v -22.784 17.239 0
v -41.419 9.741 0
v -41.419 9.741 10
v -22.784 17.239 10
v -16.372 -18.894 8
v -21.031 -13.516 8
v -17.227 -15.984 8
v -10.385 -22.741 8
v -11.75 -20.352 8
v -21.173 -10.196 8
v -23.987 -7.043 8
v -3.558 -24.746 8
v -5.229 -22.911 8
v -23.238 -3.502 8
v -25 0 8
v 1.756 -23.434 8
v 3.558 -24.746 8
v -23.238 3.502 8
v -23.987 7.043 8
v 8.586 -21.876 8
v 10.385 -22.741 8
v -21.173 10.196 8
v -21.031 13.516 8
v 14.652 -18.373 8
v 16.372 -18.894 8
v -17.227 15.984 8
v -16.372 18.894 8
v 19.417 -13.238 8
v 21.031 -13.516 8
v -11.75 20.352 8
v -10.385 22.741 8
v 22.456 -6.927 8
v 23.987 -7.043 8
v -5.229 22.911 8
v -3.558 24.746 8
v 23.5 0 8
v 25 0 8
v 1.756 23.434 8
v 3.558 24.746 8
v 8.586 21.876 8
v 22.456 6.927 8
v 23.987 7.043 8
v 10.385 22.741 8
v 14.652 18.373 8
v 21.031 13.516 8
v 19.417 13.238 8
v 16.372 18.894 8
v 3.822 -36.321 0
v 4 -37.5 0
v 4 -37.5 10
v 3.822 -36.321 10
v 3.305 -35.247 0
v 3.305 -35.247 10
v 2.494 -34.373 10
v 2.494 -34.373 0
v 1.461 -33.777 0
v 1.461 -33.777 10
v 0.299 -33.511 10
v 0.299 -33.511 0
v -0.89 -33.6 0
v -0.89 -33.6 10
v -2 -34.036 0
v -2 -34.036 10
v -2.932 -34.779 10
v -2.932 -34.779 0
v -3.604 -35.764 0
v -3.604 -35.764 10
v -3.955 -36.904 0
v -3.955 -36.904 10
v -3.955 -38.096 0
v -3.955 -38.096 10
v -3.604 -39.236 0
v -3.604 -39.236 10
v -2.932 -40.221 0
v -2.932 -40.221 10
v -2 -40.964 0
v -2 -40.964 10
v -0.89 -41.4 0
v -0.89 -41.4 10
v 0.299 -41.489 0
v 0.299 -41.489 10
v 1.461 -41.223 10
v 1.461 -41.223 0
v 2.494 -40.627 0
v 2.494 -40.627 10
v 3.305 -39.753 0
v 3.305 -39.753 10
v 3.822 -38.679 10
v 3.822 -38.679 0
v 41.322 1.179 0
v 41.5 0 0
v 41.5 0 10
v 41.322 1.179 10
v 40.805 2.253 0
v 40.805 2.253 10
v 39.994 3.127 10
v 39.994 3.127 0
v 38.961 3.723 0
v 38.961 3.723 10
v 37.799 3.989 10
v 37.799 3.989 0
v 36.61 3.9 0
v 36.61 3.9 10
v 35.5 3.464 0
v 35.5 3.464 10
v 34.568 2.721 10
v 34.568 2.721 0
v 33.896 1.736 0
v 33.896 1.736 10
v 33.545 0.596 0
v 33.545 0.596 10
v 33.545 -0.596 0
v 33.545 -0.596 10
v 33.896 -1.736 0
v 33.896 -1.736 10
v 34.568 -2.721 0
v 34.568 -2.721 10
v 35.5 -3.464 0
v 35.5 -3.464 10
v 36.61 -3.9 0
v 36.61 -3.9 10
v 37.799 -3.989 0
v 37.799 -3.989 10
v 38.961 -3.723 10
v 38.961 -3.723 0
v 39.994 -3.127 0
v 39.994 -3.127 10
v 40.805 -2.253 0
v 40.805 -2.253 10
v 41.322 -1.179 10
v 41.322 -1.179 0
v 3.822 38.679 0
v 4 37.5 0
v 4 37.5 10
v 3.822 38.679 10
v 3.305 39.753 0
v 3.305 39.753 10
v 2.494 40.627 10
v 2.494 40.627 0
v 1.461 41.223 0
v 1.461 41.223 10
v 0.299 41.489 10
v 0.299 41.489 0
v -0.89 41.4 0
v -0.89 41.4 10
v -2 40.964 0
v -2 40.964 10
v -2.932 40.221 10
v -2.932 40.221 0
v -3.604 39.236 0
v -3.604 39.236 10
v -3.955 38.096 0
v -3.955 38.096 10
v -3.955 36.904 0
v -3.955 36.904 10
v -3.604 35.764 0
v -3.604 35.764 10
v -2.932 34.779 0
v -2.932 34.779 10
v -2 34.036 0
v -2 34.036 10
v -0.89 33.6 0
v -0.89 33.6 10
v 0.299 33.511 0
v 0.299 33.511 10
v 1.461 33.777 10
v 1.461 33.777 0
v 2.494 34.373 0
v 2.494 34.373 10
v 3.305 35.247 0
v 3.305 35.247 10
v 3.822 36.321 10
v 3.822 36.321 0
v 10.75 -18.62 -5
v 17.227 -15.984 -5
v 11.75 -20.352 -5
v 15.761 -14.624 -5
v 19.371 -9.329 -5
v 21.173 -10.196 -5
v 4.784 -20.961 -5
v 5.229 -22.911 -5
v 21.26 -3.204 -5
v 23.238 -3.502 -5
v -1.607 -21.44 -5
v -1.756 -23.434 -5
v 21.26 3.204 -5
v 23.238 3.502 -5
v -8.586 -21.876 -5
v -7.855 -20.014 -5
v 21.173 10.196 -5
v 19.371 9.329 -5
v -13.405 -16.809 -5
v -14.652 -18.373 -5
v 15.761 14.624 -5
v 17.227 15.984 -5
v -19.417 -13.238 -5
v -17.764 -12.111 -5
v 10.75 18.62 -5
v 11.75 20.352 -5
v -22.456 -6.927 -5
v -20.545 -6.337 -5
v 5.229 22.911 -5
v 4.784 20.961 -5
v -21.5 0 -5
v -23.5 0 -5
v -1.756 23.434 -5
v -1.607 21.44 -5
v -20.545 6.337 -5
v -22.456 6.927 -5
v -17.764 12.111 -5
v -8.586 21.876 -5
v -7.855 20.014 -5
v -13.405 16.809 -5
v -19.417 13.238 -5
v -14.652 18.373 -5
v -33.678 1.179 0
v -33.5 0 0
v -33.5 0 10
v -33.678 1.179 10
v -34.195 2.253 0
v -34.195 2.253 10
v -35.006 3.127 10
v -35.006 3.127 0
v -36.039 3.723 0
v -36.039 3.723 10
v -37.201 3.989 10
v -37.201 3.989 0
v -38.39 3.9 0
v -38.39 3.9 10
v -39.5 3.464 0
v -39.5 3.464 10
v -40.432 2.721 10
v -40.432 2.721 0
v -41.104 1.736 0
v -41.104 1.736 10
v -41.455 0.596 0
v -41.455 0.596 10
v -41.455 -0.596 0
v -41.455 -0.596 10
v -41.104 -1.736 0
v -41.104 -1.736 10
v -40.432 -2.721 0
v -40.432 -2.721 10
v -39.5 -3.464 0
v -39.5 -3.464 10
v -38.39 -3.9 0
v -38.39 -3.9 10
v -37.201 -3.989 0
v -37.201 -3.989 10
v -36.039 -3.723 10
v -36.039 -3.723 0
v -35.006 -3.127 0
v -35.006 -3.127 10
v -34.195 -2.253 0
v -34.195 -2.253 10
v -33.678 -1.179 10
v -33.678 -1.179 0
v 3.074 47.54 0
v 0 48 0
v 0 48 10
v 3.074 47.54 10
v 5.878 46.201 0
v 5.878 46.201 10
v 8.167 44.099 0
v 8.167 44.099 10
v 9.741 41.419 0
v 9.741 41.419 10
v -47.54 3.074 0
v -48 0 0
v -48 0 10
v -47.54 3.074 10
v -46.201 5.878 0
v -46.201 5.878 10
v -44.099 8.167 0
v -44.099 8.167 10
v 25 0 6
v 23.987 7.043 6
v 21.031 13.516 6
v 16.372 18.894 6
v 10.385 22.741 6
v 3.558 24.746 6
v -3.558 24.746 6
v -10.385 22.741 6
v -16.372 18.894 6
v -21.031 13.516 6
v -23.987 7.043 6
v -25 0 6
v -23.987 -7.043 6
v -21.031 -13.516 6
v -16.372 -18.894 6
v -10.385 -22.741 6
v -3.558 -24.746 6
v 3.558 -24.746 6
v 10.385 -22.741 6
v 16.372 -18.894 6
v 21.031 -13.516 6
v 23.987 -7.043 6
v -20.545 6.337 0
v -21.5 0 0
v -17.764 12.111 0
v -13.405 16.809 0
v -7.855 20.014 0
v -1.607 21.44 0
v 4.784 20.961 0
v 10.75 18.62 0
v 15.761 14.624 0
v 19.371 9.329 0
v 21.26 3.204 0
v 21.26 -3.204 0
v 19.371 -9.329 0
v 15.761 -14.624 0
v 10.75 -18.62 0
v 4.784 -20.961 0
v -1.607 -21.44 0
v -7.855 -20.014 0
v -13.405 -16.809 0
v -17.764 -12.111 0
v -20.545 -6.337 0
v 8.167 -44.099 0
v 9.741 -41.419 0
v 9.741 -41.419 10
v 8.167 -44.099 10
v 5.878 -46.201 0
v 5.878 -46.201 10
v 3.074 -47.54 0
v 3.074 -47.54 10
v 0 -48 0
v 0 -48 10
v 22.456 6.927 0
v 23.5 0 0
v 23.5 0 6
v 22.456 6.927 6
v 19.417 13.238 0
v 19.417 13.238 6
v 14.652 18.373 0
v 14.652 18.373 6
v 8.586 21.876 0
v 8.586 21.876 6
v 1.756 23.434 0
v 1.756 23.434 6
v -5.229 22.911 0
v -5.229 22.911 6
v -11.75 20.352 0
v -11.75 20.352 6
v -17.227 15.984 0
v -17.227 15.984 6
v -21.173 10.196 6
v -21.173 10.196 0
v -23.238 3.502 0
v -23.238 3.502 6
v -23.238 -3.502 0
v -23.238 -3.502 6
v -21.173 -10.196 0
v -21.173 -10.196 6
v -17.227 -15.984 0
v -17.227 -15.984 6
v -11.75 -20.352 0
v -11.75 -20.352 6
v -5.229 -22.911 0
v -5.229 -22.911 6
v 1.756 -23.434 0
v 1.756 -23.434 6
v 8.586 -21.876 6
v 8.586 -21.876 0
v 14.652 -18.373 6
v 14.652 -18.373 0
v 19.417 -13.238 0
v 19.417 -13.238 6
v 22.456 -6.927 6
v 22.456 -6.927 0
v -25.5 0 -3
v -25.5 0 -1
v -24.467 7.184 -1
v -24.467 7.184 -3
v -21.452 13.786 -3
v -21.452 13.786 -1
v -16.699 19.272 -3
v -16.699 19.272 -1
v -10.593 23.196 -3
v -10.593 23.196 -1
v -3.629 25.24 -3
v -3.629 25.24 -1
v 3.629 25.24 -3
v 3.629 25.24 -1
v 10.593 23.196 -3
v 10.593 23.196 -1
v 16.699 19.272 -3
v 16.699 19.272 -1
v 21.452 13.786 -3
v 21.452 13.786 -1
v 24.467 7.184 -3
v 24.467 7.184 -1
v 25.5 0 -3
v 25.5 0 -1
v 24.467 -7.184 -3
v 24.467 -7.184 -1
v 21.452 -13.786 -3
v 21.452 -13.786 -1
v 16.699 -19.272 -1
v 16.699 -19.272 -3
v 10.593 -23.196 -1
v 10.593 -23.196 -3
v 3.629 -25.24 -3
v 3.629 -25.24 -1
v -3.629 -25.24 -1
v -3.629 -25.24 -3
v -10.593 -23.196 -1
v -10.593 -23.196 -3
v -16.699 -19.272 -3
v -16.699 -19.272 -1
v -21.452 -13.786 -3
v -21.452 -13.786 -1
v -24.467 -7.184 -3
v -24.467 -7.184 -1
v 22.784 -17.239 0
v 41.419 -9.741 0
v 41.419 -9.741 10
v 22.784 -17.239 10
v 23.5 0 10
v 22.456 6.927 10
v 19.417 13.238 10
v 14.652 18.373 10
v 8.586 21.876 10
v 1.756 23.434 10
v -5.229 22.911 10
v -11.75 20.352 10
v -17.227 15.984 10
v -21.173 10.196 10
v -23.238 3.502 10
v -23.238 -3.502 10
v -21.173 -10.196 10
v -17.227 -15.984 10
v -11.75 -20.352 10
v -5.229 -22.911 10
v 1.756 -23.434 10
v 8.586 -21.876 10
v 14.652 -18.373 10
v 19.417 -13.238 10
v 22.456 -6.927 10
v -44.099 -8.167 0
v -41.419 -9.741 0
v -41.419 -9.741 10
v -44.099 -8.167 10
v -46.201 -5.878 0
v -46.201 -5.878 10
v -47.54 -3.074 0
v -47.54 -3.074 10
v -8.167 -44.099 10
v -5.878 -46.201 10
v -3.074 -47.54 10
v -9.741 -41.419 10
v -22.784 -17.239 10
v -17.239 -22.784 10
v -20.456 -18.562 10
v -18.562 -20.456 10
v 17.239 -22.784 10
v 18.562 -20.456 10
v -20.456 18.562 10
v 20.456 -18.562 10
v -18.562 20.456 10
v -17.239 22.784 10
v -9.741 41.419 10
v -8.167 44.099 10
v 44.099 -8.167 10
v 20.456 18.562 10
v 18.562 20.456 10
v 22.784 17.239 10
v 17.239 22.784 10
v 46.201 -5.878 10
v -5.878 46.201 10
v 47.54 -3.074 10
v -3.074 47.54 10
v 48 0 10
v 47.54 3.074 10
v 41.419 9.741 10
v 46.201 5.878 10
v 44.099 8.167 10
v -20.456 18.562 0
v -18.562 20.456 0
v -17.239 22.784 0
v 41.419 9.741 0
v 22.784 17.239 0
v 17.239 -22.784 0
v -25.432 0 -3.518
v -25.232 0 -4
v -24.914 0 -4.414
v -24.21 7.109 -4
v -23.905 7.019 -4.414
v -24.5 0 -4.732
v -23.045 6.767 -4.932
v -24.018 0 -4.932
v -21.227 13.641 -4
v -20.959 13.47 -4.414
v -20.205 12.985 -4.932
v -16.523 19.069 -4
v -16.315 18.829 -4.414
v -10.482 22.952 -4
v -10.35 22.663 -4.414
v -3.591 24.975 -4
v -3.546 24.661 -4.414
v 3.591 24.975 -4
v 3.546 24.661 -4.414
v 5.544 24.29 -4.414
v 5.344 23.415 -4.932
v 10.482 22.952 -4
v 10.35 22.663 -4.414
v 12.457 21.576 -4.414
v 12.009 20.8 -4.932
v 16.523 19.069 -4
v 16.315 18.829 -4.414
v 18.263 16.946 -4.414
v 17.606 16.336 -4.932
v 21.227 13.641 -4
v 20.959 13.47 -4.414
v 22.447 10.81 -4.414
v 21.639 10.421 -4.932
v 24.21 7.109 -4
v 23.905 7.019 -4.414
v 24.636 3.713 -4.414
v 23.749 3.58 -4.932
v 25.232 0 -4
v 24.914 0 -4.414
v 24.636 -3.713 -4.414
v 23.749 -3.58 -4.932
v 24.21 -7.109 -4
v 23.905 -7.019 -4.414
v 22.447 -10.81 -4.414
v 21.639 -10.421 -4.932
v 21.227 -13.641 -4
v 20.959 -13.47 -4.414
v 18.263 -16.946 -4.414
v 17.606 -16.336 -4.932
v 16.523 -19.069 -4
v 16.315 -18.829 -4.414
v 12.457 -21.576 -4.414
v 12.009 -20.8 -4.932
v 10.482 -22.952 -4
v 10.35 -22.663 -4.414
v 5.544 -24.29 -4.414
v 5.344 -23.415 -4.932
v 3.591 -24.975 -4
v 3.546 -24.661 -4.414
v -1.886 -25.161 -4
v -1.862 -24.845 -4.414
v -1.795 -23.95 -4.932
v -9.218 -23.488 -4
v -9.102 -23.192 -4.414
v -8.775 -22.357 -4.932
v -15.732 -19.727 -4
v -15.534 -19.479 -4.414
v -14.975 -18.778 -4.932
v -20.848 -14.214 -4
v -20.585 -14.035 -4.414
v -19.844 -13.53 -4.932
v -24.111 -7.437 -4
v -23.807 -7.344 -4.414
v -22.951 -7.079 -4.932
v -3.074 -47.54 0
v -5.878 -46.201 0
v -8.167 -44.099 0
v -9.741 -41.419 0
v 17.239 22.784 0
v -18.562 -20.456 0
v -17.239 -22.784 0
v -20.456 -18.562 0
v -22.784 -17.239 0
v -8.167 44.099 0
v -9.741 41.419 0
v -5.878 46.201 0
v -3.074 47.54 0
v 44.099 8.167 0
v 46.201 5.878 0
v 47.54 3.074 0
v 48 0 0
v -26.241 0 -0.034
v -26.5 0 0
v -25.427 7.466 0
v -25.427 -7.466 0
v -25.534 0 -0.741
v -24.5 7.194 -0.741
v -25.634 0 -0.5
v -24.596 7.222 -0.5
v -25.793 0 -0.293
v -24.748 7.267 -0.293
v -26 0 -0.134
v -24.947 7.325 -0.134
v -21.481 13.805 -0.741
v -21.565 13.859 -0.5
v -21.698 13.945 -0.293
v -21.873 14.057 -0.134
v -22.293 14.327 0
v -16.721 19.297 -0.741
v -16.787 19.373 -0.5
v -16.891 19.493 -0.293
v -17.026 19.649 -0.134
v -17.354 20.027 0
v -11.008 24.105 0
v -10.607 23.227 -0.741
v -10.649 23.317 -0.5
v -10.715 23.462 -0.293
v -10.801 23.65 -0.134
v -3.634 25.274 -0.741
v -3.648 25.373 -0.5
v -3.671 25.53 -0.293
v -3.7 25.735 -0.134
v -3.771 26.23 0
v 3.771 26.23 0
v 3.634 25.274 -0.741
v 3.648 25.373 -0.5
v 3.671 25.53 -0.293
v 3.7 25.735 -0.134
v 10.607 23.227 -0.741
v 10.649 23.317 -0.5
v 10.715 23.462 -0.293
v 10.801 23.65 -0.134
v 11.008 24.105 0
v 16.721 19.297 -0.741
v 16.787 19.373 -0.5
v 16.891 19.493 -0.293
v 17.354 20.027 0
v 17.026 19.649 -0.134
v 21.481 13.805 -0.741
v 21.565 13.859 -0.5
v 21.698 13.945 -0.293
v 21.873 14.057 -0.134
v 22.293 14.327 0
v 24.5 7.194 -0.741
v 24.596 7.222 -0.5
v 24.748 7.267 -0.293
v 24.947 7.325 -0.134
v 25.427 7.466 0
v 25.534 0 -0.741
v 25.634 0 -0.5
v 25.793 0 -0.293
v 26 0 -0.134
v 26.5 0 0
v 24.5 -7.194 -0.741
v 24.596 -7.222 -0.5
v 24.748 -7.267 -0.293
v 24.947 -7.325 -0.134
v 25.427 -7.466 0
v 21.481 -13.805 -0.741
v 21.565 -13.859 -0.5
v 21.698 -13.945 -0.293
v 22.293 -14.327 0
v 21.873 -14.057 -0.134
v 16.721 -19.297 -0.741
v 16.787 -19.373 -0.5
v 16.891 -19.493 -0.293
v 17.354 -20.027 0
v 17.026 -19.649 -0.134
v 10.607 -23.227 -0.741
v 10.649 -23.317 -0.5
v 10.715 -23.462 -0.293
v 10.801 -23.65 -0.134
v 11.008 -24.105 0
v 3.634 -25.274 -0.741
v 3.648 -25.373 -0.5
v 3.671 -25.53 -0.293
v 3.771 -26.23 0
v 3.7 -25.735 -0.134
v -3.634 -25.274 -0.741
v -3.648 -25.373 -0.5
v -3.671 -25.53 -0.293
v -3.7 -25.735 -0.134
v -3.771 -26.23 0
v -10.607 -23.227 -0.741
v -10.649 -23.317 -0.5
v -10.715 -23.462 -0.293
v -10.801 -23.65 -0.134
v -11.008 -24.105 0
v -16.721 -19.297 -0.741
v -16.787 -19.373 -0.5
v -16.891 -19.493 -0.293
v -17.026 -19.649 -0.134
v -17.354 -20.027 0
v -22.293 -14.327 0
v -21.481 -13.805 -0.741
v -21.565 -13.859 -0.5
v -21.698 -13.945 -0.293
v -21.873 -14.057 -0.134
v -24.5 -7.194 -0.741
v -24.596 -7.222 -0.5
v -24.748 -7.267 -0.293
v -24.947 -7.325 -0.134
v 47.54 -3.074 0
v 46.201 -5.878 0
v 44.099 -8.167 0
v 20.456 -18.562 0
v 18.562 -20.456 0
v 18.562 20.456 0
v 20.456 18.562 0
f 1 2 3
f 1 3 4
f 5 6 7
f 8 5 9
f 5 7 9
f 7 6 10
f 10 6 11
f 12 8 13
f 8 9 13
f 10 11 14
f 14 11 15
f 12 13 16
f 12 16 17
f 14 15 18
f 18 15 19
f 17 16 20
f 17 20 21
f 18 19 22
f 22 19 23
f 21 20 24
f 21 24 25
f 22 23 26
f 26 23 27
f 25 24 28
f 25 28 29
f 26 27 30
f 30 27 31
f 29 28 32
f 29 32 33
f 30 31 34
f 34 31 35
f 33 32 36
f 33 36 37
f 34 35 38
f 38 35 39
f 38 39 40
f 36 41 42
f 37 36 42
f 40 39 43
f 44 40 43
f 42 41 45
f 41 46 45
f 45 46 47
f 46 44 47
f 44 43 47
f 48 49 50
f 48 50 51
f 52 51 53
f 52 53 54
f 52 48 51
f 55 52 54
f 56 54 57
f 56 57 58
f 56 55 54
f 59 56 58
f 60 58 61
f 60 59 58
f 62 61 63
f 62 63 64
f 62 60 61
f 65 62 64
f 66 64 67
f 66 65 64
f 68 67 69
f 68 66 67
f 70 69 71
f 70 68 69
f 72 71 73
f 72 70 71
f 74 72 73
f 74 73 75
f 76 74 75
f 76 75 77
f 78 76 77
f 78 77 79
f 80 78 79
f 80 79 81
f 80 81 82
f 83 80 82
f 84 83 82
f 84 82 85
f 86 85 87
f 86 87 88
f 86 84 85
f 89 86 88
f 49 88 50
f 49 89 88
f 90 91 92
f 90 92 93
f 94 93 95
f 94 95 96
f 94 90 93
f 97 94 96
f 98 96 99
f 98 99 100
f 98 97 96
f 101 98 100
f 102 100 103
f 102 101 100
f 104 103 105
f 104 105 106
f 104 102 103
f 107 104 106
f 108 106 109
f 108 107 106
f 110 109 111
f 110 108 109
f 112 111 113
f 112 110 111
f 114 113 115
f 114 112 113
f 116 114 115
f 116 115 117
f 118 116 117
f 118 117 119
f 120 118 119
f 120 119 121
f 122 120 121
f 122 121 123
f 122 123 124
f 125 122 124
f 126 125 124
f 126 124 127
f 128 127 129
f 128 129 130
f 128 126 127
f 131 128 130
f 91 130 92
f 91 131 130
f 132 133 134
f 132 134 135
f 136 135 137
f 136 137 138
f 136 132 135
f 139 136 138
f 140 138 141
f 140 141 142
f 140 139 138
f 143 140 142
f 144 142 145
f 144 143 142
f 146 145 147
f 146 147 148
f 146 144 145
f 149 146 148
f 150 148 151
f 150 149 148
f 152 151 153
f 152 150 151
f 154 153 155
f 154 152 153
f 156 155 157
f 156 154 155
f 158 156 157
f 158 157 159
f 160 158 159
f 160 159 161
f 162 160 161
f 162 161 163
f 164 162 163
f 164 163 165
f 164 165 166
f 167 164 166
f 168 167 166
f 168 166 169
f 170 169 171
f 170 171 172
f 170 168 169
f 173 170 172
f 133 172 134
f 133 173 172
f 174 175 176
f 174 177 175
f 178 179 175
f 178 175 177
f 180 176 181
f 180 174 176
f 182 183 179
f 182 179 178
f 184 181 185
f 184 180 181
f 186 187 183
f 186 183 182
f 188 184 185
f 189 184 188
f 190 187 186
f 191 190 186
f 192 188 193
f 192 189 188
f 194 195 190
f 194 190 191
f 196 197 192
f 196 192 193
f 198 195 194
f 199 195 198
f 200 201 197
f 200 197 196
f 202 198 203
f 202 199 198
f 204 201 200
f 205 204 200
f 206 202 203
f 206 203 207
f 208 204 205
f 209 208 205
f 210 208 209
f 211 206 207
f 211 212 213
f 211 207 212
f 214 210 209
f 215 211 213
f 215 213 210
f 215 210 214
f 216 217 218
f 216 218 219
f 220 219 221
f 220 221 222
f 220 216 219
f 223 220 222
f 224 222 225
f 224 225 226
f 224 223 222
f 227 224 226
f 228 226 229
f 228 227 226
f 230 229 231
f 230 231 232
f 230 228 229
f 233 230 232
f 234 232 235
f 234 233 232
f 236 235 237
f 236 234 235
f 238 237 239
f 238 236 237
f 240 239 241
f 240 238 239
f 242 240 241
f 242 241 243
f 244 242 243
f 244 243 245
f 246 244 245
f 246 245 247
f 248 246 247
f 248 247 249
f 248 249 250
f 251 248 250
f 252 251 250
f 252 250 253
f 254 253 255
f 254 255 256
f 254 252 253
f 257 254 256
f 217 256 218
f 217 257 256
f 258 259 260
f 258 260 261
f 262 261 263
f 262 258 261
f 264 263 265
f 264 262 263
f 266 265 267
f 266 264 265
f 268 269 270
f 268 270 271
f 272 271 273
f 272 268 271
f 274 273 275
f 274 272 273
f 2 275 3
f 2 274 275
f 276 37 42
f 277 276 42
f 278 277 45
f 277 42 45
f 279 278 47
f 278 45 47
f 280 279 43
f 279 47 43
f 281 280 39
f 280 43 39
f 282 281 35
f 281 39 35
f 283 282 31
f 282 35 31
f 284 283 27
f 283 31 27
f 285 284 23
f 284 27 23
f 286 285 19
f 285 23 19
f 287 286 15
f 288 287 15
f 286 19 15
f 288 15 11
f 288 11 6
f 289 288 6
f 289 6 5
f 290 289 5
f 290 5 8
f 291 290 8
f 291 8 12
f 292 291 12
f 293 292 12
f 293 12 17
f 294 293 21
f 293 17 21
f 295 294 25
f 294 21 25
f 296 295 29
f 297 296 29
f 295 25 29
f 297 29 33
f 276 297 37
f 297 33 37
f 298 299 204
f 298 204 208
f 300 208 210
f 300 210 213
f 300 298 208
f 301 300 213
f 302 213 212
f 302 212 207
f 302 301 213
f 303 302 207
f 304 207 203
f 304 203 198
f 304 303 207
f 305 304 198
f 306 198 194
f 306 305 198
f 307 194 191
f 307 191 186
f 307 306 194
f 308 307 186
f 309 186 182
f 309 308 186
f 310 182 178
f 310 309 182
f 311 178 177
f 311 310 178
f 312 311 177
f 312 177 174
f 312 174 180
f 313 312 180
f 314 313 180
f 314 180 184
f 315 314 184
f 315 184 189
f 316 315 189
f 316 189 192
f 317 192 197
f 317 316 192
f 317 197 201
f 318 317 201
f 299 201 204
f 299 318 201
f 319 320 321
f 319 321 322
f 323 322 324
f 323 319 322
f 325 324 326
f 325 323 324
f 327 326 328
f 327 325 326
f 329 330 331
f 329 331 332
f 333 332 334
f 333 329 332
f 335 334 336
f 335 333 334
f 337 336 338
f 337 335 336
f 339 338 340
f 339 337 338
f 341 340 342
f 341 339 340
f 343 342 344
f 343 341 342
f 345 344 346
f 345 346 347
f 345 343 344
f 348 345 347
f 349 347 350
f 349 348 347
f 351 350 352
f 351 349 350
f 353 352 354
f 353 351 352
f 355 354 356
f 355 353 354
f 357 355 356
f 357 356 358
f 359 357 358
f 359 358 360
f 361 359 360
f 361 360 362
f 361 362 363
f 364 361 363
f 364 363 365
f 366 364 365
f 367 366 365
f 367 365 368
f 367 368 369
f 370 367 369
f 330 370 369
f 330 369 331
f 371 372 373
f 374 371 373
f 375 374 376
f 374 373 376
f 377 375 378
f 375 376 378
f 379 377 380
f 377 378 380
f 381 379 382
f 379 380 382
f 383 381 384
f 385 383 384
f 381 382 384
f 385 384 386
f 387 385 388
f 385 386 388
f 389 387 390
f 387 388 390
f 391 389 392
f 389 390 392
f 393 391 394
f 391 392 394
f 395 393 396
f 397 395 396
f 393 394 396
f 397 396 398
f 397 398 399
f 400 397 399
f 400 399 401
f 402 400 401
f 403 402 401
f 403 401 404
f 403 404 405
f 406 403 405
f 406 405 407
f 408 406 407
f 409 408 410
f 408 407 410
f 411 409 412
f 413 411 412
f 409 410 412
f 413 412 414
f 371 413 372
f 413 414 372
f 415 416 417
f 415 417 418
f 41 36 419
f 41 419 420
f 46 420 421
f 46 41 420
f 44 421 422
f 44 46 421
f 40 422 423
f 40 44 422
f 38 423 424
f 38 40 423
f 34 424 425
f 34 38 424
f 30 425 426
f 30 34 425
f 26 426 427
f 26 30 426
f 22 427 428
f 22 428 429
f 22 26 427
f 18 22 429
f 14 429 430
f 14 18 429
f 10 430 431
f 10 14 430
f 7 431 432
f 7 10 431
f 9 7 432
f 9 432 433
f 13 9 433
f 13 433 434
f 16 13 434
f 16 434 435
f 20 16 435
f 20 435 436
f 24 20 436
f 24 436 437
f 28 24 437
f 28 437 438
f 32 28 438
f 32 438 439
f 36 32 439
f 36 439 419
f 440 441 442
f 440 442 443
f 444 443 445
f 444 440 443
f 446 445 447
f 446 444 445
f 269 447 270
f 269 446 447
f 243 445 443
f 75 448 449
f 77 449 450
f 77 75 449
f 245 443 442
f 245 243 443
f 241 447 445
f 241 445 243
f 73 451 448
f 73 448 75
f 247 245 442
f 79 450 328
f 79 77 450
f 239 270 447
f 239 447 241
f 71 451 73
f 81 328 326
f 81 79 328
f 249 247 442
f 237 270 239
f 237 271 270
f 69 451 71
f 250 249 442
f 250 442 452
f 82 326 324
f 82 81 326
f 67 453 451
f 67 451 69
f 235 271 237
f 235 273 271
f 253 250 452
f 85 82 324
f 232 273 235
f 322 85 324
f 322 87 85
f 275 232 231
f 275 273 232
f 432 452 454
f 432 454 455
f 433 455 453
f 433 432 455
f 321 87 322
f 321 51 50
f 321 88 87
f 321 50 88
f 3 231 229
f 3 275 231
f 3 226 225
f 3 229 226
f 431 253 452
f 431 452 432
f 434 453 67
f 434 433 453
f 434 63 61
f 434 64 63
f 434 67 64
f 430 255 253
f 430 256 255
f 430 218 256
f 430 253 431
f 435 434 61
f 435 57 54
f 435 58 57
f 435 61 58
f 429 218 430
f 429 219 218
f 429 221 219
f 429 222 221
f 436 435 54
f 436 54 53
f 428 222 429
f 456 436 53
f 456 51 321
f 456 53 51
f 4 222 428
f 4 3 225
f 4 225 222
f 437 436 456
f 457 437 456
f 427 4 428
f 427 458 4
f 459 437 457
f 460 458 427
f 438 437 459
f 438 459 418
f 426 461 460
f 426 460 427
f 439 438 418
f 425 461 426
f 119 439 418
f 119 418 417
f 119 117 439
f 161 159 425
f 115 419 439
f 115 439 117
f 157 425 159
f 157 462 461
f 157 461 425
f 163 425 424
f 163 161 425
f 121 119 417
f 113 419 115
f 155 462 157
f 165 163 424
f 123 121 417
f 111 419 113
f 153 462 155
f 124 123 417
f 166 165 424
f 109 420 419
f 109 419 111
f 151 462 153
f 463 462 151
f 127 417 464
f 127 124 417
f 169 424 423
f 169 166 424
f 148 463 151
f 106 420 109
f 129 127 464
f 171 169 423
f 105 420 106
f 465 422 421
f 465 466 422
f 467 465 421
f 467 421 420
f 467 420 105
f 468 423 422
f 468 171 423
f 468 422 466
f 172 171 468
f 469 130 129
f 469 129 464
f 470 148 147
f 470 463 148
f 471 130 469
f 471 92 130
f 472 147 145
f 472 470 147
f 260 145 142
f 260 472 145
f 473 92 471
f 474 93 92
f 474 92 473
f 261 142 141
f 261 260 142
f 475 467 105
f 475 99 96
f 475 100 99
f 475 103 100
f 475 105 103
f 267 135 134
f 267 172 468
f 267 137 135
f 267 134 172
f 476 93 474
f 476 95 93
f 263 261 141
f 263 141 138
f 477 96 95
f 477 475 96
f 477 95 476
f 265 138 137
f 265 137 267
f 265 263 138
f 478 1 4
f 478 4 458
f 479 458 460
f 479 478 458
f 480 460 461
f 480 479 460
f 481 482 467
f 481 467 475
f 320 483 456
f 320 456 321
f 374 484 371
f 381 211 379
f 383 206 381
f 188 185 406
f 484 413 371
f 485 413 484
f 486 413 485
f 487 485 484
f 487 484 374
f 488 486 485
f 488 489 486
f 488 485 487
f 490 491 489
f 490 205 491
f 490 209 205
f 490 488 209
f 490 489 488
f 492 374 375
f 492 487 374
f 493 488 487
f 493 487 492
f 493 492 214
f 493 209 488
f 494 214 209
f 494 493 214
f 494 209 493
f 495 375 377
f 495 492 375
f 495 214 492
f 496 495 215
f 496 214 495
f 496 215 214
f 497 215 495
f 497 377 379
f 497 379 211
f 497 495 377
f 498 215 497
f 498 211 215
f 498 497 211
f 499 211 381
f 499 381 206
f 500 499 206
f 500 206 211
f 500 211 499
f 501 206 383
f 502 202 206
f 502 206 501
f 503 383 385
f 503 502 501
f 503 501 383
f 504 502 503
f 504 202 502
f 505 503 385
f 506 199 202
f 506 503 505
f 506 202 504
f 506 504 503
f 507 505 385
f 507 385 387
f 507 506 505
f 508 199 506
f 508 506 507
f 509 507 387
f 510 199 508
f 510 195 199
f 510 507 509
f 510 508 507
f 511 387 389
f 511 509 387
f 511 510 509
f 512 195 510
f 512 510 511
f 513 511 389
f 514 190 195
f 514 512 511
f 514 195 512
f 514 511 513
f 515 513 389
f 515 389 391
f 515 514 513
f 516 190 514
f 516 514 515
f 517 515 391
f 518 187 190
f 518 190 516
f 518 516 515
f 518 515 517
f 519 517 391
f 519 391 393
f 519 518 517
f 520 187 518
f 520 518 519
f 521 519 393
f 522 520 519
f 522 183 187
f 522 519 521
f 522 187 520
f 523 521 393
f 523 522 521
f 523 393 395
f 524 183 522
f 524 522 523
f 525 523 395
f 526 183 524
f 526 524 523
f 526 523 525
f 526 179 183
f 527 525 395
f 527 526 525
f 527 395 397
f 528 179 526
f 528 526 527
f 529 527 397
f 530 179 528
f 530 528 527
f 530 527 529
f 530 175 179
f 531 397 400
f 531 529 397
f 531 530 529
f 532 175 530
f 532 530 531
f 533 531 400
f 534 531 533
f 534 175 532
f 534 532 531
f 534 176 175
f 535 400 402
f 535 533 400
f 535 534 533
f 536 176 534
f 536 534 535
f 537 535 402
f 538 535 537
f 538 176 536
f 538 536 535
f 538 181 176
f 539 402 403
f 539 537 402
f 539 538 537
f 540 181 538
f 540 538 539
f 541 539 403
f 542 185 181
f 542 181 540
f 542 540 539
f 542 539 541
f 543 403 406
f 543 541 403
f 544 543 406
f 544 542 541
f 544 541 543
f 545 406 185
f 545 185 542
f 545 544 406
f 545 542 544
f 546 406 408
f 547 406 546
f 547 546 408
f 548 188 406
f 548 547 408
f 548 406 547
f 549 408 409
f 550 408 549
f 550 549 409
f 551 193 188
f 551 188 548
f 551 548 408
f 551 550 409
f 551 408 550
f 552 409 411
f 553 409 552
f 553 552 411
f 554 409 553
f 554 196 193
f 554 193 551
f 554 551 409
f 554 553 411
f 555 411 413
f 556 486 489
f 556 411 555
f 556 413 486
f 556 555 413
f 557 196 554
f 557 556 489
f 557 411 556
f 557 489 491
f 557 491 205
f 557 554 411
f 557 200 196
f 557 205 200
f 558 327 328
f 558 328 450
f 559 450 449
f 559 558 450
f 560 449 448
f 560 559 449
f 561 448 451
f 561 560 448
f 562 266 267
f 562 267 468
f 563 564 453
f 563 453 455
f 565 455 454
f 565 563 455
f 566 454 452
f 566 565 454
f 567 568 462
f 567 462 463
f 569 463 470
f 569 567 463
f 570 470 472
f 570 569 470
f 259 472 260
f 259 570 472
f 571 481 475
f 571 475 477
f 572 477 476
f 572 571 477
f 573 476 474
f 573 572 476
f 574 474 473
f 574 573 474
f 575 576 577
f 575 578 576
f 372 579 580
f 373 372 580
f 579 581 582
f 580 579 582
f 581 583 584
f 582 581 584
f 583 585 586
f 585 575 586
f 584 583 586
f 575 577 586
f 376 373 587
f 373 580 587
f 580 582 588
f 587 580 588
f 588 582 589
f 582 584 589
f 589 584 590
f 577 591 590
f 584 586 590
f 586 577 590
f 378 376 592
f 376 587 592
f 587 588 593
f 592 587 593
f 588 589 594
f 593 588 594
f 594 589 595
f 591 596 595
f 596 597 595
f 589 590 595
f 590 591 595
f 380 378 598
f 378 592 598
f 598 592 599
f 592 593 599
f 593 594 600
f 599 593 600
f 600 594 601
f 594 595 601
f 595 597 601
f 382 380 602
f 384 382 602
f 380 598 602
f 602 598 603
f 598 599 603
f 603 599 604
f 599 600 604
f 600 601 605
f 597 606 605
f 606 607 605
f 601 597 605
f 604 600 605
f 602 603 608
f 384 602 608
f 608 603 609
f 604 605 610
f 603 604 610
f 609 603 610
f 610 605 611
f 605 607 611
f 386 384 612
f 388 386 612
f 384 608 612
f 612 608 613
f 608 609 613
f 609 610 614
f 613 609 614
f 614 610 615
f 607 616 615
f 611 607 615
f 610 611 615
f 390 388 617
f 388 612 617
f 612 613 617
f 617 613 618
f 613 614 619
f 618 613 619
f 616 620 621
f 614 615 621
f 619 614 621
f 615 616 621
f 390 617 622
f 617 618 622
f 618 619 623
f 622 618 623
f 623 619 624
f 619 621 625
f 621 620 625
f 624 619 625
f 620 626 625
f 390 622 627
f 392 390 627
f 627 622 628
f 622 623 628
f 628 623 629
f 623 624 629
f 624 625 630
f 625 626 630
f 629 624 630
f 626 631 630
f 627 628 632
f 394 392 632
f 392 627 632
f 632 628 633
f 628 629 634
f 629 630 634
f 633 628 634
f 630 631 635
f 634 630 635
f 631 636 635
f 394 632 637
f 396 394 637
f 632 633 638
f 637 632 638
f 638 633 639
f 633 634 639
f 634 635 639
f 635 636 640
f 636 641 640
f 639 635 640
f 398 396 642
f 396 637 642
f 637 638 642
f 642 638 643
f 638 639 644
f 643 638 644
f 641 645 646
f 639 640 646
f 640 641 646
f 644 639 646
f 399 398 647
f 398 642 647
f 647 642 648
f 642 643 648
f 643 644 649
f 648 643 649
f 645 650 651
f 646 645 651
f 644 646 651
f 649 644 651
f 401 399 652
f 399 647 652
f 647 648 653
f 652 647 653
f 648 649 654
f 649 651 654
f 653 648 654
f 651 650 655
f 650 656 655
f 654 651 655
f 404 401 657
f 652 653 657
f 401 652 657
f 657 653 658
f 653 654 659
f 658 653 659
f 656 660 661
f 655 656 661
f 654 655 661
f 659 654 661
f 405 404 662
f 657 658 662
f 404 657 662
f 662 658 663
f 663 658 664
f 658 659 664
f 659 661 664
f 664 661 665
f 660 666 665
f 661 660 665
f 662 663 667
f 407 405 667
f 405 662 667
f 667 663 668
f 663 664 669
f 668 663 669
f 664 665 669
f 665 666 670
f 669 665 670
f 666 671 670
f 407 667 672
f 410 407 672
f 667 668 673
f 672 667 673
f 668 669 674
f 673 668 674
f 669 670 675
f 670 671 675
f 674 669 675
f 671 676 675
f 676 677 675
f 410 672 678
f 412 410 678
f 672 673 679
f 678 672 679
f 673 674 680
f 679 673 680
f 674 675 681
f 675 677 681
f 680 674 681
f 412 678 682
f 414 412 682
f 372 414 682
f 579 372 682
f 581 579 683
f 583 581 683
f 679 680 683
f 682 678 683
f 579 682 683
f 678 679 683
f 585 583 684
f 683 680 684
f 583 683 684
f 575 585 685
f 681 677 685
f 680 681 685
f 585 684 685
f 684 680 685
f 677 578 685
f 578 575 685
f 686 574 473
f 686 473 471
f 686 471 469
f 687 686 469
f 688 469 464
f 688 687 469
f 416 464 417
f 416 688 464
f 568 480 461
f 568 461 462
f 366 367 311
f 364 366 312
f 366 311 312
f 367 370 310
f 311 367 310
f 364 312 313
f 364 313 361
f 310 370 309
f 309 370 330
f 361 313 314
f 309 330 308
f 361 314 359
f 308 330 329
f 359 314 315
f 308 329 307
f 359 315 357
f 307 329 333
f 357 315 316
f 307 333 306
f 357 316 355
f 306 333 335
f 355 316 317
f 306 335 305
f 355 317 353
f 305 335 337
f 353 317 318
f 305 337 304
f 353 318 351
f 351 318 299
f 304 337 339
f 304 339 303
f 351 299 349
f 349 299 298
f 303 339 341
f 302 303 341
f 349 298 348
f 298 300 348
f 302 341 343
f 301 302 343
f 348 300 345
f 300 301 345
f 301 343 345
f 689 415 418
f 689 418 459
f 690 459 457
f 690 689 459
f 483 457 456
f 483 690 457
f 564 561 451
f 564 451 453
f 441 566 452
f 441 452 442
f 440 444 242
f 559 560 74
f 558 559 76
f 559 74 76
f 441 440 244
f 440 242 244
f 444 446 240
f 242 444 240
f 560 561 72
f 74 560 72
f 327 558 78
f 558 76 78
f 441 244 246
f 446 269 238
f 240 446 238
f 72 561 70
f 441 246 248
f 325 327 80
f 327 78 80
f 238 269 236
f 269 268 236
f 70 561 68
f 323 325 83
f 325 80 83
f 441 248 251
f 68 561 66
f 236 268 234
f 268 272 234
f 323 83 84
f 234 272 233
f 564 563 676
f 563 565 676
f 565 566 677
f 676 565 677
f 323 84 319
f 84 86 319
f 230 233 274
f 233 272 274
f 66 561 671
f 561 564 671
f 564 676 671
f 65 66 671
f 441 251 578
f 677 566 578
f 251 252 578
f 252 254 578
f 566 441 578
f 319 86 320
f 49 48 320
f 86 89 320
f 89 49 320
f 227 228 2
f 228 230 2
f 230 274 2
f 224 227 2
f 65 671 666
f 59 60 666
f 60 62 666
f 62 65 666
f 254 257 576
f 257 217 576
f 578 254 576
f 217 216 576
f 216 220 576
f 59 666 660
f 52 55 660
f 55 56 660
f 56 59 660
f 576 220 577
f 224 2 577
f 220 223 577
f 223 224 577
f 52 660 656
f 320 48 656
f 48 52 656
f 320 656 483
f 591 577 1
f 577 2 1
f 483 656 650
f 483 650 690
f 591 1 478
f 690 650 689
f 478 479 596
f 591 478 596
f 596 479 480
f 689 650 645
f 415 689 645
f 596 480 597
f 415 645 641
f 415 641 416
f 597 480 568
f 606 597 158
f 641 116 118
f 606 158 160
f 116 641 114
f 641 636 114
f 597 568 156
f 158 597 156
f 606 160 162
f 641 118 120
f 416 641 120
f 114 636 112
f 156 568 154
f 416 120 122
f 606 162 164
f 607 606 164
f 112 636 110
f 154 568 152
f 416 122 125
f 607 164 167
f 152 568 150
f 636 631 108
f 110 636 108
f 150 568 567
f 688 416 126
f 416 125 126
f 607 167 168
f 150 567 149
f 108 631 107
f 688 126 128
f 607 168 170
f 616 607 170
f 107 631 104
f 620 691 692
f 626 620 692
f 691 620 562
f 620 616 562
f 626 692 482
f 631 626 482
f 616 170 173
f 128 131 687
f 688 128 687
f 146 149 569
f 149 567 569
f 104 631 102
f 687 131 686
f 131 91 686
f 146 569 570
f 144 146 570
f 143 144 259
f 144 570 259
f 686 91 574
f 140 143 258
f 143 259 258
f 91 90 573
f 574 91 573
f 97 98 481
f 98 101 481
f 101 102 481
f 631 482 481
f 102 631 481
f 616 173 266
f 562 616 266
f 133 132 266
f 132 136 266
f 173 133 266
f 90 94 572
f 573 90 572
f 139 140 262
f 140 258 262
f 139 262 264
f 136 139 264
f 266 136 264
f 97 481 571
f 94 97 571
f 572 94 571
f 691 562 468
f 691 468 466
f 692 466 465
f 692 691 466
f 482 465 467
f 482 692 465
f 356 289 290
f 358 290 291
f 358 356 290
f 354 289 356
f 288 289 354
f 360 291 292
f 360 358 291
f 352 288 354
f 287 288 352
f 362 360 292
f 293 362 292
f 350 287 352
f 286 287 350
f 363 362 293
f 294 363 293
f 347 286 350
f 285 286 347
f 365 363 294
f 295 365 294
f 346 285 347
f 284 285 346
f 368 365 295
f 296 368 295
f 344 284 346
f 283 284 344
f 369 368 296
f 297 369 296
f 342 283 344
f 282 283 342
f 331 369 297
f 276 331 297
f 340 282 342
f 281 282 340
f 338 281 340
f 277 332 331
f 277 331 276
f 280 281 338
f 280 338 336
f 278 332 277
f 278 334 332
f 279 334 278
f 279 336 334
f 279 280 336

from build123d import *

# Parameters (mm, degrees)
SKETCH1_R           = 48
SKETCH1_R_2         = 23.5
SKETCH1_R_3         = 4
BOSS_EXTRUDE1_DEPTH = 10
CUT_EXTRUDE3_START  = -2
SKETCH2_R           = 25
SKETCH2_R_2         = 23.5
CUT_EXTRUDE3_DEPTH  = 2
CUT_EXTRUDE4_DEPTH  = 11
CIRPATTERN4_COUNT   = 4
SKETCH4_R           = 25.5
SKETCH4_R_2         = 21.5
BOSS_EXTRUDE2_DEPTH = 5
FILLET1_R           = 2
FILLET2_R           = 1


with BuildPart() as part:
    # Sketch1 → Boss-Extrude1 (new body)
    with BuildSketch(Plane.XY):
        Circle(SKETCH1_R)
        Circle(SKETCH1_R_2, mode=Mode.SUBTRACT)
        with Locations((37.5, 0)):
            Circle(SKETCH1_R_3, mode=Mode.SUBTRACT)
        with Locations((0, 37.5)):
            Circle(SKETCH1_R_3, mode=Mode.SUBTRACT)
        with Locations((-37.5, 0)):
            Circle(SKETCH1_R_3, mode=Mode.SUBTRACT)
        with Locations((0, -37.5)):
            Circle(SKETCH1_R_3, mode=Mode.SUBTRACT)
    extrude(amount=BOSS_EXTRUDE1_DEPTH)

    # Sketch2 → Cut-Extrude3 (cut)
    with BuildSketch(Plane.XY.offset(10).offset(CUT_EXTRUDE3_START)):
        Circle(SKETCH2_R)
        Circle(SKETCH2_R_2, mode=Mode.SUBTRACT)
    extrude(amount=-CUT_EXTRUDE3_DEPTH, mode=Mode.SUBTRACT)

    # Sketch3 → Cut-Extrude4 (cut, through all)
    with BuildSketch(Plane(origin=(0, 0, 0), x_dir=(-1, 0, 0), z_dir=(0, 0, -1))):
        with BuildLine():
            Line((-9.741058681, 41.419410131), (-17.239305551, 22.783732741))
            ThreePointArc((-17.239305551, 22.783732741), (-19.445436483, 19.445436483), (-22.783732741, 17.239305551))
            Line((-22.783732741, 17.239305551), (-41.419410131, 9.741058681))
            ThreePointArc((-41.419410131, 9.741058681), (-46.200684064, 5.877762909), (-48, 0))
            ThreePointArc((-48, 0), (-33.941125497, 33.941125497), (0, 48))
            ThreePointArc((0, 48), (-5.877762909, 46.200684064), (-9.741058681, 41.419410131))
        make_face()
    cut_extrude4 = extrude(amount=-CUT_EXTRUDE4_DEPTH, mode=Mode.SUBTRACT)

    # CirPattern4: Cut-Extrude4 ×4 about axis
    cirpattern4_axis = Axis((0, 0, 0), (0, 0, 1))
    for i in range(1, CIRPATTERN4_COUNT):
        add(cut_extrude4.rotate(cirpattern4_axis, i * 360 / CIRPATTERN4_COUNT), mode=Mode.SUBTRACT)

    # Sketch4 → Boss-Extrude2 (add)
    with BuildSketch(Plane(origin=(0, 0, 0), x_dir=(-1, 0, 0), z_dir=(0, 0, -1))):
        Circle(SKETCH4_R)
        Circle(SKETCH4_R_2, mode=Mode.SUBTRACT)
    extrude(amount=BOSS_EXTRUDE2_DEPTH)

    # Fillet1
    fillet1_edges = [part.edges().sort_by_distance(p)[0] for p in [
        (25.5, 0, -5),
    ]]
    fillet(fillet1_edges, radius=FILLET1_R)

    # Fillet2
    fillet2_edges = [part.edges().sort_by_distance(p)[0] for p in [
        (25.5, 0, 0),
    ]]
    fillet(fillet2_edges, radius=FILLET2_R)


solid = part.part
